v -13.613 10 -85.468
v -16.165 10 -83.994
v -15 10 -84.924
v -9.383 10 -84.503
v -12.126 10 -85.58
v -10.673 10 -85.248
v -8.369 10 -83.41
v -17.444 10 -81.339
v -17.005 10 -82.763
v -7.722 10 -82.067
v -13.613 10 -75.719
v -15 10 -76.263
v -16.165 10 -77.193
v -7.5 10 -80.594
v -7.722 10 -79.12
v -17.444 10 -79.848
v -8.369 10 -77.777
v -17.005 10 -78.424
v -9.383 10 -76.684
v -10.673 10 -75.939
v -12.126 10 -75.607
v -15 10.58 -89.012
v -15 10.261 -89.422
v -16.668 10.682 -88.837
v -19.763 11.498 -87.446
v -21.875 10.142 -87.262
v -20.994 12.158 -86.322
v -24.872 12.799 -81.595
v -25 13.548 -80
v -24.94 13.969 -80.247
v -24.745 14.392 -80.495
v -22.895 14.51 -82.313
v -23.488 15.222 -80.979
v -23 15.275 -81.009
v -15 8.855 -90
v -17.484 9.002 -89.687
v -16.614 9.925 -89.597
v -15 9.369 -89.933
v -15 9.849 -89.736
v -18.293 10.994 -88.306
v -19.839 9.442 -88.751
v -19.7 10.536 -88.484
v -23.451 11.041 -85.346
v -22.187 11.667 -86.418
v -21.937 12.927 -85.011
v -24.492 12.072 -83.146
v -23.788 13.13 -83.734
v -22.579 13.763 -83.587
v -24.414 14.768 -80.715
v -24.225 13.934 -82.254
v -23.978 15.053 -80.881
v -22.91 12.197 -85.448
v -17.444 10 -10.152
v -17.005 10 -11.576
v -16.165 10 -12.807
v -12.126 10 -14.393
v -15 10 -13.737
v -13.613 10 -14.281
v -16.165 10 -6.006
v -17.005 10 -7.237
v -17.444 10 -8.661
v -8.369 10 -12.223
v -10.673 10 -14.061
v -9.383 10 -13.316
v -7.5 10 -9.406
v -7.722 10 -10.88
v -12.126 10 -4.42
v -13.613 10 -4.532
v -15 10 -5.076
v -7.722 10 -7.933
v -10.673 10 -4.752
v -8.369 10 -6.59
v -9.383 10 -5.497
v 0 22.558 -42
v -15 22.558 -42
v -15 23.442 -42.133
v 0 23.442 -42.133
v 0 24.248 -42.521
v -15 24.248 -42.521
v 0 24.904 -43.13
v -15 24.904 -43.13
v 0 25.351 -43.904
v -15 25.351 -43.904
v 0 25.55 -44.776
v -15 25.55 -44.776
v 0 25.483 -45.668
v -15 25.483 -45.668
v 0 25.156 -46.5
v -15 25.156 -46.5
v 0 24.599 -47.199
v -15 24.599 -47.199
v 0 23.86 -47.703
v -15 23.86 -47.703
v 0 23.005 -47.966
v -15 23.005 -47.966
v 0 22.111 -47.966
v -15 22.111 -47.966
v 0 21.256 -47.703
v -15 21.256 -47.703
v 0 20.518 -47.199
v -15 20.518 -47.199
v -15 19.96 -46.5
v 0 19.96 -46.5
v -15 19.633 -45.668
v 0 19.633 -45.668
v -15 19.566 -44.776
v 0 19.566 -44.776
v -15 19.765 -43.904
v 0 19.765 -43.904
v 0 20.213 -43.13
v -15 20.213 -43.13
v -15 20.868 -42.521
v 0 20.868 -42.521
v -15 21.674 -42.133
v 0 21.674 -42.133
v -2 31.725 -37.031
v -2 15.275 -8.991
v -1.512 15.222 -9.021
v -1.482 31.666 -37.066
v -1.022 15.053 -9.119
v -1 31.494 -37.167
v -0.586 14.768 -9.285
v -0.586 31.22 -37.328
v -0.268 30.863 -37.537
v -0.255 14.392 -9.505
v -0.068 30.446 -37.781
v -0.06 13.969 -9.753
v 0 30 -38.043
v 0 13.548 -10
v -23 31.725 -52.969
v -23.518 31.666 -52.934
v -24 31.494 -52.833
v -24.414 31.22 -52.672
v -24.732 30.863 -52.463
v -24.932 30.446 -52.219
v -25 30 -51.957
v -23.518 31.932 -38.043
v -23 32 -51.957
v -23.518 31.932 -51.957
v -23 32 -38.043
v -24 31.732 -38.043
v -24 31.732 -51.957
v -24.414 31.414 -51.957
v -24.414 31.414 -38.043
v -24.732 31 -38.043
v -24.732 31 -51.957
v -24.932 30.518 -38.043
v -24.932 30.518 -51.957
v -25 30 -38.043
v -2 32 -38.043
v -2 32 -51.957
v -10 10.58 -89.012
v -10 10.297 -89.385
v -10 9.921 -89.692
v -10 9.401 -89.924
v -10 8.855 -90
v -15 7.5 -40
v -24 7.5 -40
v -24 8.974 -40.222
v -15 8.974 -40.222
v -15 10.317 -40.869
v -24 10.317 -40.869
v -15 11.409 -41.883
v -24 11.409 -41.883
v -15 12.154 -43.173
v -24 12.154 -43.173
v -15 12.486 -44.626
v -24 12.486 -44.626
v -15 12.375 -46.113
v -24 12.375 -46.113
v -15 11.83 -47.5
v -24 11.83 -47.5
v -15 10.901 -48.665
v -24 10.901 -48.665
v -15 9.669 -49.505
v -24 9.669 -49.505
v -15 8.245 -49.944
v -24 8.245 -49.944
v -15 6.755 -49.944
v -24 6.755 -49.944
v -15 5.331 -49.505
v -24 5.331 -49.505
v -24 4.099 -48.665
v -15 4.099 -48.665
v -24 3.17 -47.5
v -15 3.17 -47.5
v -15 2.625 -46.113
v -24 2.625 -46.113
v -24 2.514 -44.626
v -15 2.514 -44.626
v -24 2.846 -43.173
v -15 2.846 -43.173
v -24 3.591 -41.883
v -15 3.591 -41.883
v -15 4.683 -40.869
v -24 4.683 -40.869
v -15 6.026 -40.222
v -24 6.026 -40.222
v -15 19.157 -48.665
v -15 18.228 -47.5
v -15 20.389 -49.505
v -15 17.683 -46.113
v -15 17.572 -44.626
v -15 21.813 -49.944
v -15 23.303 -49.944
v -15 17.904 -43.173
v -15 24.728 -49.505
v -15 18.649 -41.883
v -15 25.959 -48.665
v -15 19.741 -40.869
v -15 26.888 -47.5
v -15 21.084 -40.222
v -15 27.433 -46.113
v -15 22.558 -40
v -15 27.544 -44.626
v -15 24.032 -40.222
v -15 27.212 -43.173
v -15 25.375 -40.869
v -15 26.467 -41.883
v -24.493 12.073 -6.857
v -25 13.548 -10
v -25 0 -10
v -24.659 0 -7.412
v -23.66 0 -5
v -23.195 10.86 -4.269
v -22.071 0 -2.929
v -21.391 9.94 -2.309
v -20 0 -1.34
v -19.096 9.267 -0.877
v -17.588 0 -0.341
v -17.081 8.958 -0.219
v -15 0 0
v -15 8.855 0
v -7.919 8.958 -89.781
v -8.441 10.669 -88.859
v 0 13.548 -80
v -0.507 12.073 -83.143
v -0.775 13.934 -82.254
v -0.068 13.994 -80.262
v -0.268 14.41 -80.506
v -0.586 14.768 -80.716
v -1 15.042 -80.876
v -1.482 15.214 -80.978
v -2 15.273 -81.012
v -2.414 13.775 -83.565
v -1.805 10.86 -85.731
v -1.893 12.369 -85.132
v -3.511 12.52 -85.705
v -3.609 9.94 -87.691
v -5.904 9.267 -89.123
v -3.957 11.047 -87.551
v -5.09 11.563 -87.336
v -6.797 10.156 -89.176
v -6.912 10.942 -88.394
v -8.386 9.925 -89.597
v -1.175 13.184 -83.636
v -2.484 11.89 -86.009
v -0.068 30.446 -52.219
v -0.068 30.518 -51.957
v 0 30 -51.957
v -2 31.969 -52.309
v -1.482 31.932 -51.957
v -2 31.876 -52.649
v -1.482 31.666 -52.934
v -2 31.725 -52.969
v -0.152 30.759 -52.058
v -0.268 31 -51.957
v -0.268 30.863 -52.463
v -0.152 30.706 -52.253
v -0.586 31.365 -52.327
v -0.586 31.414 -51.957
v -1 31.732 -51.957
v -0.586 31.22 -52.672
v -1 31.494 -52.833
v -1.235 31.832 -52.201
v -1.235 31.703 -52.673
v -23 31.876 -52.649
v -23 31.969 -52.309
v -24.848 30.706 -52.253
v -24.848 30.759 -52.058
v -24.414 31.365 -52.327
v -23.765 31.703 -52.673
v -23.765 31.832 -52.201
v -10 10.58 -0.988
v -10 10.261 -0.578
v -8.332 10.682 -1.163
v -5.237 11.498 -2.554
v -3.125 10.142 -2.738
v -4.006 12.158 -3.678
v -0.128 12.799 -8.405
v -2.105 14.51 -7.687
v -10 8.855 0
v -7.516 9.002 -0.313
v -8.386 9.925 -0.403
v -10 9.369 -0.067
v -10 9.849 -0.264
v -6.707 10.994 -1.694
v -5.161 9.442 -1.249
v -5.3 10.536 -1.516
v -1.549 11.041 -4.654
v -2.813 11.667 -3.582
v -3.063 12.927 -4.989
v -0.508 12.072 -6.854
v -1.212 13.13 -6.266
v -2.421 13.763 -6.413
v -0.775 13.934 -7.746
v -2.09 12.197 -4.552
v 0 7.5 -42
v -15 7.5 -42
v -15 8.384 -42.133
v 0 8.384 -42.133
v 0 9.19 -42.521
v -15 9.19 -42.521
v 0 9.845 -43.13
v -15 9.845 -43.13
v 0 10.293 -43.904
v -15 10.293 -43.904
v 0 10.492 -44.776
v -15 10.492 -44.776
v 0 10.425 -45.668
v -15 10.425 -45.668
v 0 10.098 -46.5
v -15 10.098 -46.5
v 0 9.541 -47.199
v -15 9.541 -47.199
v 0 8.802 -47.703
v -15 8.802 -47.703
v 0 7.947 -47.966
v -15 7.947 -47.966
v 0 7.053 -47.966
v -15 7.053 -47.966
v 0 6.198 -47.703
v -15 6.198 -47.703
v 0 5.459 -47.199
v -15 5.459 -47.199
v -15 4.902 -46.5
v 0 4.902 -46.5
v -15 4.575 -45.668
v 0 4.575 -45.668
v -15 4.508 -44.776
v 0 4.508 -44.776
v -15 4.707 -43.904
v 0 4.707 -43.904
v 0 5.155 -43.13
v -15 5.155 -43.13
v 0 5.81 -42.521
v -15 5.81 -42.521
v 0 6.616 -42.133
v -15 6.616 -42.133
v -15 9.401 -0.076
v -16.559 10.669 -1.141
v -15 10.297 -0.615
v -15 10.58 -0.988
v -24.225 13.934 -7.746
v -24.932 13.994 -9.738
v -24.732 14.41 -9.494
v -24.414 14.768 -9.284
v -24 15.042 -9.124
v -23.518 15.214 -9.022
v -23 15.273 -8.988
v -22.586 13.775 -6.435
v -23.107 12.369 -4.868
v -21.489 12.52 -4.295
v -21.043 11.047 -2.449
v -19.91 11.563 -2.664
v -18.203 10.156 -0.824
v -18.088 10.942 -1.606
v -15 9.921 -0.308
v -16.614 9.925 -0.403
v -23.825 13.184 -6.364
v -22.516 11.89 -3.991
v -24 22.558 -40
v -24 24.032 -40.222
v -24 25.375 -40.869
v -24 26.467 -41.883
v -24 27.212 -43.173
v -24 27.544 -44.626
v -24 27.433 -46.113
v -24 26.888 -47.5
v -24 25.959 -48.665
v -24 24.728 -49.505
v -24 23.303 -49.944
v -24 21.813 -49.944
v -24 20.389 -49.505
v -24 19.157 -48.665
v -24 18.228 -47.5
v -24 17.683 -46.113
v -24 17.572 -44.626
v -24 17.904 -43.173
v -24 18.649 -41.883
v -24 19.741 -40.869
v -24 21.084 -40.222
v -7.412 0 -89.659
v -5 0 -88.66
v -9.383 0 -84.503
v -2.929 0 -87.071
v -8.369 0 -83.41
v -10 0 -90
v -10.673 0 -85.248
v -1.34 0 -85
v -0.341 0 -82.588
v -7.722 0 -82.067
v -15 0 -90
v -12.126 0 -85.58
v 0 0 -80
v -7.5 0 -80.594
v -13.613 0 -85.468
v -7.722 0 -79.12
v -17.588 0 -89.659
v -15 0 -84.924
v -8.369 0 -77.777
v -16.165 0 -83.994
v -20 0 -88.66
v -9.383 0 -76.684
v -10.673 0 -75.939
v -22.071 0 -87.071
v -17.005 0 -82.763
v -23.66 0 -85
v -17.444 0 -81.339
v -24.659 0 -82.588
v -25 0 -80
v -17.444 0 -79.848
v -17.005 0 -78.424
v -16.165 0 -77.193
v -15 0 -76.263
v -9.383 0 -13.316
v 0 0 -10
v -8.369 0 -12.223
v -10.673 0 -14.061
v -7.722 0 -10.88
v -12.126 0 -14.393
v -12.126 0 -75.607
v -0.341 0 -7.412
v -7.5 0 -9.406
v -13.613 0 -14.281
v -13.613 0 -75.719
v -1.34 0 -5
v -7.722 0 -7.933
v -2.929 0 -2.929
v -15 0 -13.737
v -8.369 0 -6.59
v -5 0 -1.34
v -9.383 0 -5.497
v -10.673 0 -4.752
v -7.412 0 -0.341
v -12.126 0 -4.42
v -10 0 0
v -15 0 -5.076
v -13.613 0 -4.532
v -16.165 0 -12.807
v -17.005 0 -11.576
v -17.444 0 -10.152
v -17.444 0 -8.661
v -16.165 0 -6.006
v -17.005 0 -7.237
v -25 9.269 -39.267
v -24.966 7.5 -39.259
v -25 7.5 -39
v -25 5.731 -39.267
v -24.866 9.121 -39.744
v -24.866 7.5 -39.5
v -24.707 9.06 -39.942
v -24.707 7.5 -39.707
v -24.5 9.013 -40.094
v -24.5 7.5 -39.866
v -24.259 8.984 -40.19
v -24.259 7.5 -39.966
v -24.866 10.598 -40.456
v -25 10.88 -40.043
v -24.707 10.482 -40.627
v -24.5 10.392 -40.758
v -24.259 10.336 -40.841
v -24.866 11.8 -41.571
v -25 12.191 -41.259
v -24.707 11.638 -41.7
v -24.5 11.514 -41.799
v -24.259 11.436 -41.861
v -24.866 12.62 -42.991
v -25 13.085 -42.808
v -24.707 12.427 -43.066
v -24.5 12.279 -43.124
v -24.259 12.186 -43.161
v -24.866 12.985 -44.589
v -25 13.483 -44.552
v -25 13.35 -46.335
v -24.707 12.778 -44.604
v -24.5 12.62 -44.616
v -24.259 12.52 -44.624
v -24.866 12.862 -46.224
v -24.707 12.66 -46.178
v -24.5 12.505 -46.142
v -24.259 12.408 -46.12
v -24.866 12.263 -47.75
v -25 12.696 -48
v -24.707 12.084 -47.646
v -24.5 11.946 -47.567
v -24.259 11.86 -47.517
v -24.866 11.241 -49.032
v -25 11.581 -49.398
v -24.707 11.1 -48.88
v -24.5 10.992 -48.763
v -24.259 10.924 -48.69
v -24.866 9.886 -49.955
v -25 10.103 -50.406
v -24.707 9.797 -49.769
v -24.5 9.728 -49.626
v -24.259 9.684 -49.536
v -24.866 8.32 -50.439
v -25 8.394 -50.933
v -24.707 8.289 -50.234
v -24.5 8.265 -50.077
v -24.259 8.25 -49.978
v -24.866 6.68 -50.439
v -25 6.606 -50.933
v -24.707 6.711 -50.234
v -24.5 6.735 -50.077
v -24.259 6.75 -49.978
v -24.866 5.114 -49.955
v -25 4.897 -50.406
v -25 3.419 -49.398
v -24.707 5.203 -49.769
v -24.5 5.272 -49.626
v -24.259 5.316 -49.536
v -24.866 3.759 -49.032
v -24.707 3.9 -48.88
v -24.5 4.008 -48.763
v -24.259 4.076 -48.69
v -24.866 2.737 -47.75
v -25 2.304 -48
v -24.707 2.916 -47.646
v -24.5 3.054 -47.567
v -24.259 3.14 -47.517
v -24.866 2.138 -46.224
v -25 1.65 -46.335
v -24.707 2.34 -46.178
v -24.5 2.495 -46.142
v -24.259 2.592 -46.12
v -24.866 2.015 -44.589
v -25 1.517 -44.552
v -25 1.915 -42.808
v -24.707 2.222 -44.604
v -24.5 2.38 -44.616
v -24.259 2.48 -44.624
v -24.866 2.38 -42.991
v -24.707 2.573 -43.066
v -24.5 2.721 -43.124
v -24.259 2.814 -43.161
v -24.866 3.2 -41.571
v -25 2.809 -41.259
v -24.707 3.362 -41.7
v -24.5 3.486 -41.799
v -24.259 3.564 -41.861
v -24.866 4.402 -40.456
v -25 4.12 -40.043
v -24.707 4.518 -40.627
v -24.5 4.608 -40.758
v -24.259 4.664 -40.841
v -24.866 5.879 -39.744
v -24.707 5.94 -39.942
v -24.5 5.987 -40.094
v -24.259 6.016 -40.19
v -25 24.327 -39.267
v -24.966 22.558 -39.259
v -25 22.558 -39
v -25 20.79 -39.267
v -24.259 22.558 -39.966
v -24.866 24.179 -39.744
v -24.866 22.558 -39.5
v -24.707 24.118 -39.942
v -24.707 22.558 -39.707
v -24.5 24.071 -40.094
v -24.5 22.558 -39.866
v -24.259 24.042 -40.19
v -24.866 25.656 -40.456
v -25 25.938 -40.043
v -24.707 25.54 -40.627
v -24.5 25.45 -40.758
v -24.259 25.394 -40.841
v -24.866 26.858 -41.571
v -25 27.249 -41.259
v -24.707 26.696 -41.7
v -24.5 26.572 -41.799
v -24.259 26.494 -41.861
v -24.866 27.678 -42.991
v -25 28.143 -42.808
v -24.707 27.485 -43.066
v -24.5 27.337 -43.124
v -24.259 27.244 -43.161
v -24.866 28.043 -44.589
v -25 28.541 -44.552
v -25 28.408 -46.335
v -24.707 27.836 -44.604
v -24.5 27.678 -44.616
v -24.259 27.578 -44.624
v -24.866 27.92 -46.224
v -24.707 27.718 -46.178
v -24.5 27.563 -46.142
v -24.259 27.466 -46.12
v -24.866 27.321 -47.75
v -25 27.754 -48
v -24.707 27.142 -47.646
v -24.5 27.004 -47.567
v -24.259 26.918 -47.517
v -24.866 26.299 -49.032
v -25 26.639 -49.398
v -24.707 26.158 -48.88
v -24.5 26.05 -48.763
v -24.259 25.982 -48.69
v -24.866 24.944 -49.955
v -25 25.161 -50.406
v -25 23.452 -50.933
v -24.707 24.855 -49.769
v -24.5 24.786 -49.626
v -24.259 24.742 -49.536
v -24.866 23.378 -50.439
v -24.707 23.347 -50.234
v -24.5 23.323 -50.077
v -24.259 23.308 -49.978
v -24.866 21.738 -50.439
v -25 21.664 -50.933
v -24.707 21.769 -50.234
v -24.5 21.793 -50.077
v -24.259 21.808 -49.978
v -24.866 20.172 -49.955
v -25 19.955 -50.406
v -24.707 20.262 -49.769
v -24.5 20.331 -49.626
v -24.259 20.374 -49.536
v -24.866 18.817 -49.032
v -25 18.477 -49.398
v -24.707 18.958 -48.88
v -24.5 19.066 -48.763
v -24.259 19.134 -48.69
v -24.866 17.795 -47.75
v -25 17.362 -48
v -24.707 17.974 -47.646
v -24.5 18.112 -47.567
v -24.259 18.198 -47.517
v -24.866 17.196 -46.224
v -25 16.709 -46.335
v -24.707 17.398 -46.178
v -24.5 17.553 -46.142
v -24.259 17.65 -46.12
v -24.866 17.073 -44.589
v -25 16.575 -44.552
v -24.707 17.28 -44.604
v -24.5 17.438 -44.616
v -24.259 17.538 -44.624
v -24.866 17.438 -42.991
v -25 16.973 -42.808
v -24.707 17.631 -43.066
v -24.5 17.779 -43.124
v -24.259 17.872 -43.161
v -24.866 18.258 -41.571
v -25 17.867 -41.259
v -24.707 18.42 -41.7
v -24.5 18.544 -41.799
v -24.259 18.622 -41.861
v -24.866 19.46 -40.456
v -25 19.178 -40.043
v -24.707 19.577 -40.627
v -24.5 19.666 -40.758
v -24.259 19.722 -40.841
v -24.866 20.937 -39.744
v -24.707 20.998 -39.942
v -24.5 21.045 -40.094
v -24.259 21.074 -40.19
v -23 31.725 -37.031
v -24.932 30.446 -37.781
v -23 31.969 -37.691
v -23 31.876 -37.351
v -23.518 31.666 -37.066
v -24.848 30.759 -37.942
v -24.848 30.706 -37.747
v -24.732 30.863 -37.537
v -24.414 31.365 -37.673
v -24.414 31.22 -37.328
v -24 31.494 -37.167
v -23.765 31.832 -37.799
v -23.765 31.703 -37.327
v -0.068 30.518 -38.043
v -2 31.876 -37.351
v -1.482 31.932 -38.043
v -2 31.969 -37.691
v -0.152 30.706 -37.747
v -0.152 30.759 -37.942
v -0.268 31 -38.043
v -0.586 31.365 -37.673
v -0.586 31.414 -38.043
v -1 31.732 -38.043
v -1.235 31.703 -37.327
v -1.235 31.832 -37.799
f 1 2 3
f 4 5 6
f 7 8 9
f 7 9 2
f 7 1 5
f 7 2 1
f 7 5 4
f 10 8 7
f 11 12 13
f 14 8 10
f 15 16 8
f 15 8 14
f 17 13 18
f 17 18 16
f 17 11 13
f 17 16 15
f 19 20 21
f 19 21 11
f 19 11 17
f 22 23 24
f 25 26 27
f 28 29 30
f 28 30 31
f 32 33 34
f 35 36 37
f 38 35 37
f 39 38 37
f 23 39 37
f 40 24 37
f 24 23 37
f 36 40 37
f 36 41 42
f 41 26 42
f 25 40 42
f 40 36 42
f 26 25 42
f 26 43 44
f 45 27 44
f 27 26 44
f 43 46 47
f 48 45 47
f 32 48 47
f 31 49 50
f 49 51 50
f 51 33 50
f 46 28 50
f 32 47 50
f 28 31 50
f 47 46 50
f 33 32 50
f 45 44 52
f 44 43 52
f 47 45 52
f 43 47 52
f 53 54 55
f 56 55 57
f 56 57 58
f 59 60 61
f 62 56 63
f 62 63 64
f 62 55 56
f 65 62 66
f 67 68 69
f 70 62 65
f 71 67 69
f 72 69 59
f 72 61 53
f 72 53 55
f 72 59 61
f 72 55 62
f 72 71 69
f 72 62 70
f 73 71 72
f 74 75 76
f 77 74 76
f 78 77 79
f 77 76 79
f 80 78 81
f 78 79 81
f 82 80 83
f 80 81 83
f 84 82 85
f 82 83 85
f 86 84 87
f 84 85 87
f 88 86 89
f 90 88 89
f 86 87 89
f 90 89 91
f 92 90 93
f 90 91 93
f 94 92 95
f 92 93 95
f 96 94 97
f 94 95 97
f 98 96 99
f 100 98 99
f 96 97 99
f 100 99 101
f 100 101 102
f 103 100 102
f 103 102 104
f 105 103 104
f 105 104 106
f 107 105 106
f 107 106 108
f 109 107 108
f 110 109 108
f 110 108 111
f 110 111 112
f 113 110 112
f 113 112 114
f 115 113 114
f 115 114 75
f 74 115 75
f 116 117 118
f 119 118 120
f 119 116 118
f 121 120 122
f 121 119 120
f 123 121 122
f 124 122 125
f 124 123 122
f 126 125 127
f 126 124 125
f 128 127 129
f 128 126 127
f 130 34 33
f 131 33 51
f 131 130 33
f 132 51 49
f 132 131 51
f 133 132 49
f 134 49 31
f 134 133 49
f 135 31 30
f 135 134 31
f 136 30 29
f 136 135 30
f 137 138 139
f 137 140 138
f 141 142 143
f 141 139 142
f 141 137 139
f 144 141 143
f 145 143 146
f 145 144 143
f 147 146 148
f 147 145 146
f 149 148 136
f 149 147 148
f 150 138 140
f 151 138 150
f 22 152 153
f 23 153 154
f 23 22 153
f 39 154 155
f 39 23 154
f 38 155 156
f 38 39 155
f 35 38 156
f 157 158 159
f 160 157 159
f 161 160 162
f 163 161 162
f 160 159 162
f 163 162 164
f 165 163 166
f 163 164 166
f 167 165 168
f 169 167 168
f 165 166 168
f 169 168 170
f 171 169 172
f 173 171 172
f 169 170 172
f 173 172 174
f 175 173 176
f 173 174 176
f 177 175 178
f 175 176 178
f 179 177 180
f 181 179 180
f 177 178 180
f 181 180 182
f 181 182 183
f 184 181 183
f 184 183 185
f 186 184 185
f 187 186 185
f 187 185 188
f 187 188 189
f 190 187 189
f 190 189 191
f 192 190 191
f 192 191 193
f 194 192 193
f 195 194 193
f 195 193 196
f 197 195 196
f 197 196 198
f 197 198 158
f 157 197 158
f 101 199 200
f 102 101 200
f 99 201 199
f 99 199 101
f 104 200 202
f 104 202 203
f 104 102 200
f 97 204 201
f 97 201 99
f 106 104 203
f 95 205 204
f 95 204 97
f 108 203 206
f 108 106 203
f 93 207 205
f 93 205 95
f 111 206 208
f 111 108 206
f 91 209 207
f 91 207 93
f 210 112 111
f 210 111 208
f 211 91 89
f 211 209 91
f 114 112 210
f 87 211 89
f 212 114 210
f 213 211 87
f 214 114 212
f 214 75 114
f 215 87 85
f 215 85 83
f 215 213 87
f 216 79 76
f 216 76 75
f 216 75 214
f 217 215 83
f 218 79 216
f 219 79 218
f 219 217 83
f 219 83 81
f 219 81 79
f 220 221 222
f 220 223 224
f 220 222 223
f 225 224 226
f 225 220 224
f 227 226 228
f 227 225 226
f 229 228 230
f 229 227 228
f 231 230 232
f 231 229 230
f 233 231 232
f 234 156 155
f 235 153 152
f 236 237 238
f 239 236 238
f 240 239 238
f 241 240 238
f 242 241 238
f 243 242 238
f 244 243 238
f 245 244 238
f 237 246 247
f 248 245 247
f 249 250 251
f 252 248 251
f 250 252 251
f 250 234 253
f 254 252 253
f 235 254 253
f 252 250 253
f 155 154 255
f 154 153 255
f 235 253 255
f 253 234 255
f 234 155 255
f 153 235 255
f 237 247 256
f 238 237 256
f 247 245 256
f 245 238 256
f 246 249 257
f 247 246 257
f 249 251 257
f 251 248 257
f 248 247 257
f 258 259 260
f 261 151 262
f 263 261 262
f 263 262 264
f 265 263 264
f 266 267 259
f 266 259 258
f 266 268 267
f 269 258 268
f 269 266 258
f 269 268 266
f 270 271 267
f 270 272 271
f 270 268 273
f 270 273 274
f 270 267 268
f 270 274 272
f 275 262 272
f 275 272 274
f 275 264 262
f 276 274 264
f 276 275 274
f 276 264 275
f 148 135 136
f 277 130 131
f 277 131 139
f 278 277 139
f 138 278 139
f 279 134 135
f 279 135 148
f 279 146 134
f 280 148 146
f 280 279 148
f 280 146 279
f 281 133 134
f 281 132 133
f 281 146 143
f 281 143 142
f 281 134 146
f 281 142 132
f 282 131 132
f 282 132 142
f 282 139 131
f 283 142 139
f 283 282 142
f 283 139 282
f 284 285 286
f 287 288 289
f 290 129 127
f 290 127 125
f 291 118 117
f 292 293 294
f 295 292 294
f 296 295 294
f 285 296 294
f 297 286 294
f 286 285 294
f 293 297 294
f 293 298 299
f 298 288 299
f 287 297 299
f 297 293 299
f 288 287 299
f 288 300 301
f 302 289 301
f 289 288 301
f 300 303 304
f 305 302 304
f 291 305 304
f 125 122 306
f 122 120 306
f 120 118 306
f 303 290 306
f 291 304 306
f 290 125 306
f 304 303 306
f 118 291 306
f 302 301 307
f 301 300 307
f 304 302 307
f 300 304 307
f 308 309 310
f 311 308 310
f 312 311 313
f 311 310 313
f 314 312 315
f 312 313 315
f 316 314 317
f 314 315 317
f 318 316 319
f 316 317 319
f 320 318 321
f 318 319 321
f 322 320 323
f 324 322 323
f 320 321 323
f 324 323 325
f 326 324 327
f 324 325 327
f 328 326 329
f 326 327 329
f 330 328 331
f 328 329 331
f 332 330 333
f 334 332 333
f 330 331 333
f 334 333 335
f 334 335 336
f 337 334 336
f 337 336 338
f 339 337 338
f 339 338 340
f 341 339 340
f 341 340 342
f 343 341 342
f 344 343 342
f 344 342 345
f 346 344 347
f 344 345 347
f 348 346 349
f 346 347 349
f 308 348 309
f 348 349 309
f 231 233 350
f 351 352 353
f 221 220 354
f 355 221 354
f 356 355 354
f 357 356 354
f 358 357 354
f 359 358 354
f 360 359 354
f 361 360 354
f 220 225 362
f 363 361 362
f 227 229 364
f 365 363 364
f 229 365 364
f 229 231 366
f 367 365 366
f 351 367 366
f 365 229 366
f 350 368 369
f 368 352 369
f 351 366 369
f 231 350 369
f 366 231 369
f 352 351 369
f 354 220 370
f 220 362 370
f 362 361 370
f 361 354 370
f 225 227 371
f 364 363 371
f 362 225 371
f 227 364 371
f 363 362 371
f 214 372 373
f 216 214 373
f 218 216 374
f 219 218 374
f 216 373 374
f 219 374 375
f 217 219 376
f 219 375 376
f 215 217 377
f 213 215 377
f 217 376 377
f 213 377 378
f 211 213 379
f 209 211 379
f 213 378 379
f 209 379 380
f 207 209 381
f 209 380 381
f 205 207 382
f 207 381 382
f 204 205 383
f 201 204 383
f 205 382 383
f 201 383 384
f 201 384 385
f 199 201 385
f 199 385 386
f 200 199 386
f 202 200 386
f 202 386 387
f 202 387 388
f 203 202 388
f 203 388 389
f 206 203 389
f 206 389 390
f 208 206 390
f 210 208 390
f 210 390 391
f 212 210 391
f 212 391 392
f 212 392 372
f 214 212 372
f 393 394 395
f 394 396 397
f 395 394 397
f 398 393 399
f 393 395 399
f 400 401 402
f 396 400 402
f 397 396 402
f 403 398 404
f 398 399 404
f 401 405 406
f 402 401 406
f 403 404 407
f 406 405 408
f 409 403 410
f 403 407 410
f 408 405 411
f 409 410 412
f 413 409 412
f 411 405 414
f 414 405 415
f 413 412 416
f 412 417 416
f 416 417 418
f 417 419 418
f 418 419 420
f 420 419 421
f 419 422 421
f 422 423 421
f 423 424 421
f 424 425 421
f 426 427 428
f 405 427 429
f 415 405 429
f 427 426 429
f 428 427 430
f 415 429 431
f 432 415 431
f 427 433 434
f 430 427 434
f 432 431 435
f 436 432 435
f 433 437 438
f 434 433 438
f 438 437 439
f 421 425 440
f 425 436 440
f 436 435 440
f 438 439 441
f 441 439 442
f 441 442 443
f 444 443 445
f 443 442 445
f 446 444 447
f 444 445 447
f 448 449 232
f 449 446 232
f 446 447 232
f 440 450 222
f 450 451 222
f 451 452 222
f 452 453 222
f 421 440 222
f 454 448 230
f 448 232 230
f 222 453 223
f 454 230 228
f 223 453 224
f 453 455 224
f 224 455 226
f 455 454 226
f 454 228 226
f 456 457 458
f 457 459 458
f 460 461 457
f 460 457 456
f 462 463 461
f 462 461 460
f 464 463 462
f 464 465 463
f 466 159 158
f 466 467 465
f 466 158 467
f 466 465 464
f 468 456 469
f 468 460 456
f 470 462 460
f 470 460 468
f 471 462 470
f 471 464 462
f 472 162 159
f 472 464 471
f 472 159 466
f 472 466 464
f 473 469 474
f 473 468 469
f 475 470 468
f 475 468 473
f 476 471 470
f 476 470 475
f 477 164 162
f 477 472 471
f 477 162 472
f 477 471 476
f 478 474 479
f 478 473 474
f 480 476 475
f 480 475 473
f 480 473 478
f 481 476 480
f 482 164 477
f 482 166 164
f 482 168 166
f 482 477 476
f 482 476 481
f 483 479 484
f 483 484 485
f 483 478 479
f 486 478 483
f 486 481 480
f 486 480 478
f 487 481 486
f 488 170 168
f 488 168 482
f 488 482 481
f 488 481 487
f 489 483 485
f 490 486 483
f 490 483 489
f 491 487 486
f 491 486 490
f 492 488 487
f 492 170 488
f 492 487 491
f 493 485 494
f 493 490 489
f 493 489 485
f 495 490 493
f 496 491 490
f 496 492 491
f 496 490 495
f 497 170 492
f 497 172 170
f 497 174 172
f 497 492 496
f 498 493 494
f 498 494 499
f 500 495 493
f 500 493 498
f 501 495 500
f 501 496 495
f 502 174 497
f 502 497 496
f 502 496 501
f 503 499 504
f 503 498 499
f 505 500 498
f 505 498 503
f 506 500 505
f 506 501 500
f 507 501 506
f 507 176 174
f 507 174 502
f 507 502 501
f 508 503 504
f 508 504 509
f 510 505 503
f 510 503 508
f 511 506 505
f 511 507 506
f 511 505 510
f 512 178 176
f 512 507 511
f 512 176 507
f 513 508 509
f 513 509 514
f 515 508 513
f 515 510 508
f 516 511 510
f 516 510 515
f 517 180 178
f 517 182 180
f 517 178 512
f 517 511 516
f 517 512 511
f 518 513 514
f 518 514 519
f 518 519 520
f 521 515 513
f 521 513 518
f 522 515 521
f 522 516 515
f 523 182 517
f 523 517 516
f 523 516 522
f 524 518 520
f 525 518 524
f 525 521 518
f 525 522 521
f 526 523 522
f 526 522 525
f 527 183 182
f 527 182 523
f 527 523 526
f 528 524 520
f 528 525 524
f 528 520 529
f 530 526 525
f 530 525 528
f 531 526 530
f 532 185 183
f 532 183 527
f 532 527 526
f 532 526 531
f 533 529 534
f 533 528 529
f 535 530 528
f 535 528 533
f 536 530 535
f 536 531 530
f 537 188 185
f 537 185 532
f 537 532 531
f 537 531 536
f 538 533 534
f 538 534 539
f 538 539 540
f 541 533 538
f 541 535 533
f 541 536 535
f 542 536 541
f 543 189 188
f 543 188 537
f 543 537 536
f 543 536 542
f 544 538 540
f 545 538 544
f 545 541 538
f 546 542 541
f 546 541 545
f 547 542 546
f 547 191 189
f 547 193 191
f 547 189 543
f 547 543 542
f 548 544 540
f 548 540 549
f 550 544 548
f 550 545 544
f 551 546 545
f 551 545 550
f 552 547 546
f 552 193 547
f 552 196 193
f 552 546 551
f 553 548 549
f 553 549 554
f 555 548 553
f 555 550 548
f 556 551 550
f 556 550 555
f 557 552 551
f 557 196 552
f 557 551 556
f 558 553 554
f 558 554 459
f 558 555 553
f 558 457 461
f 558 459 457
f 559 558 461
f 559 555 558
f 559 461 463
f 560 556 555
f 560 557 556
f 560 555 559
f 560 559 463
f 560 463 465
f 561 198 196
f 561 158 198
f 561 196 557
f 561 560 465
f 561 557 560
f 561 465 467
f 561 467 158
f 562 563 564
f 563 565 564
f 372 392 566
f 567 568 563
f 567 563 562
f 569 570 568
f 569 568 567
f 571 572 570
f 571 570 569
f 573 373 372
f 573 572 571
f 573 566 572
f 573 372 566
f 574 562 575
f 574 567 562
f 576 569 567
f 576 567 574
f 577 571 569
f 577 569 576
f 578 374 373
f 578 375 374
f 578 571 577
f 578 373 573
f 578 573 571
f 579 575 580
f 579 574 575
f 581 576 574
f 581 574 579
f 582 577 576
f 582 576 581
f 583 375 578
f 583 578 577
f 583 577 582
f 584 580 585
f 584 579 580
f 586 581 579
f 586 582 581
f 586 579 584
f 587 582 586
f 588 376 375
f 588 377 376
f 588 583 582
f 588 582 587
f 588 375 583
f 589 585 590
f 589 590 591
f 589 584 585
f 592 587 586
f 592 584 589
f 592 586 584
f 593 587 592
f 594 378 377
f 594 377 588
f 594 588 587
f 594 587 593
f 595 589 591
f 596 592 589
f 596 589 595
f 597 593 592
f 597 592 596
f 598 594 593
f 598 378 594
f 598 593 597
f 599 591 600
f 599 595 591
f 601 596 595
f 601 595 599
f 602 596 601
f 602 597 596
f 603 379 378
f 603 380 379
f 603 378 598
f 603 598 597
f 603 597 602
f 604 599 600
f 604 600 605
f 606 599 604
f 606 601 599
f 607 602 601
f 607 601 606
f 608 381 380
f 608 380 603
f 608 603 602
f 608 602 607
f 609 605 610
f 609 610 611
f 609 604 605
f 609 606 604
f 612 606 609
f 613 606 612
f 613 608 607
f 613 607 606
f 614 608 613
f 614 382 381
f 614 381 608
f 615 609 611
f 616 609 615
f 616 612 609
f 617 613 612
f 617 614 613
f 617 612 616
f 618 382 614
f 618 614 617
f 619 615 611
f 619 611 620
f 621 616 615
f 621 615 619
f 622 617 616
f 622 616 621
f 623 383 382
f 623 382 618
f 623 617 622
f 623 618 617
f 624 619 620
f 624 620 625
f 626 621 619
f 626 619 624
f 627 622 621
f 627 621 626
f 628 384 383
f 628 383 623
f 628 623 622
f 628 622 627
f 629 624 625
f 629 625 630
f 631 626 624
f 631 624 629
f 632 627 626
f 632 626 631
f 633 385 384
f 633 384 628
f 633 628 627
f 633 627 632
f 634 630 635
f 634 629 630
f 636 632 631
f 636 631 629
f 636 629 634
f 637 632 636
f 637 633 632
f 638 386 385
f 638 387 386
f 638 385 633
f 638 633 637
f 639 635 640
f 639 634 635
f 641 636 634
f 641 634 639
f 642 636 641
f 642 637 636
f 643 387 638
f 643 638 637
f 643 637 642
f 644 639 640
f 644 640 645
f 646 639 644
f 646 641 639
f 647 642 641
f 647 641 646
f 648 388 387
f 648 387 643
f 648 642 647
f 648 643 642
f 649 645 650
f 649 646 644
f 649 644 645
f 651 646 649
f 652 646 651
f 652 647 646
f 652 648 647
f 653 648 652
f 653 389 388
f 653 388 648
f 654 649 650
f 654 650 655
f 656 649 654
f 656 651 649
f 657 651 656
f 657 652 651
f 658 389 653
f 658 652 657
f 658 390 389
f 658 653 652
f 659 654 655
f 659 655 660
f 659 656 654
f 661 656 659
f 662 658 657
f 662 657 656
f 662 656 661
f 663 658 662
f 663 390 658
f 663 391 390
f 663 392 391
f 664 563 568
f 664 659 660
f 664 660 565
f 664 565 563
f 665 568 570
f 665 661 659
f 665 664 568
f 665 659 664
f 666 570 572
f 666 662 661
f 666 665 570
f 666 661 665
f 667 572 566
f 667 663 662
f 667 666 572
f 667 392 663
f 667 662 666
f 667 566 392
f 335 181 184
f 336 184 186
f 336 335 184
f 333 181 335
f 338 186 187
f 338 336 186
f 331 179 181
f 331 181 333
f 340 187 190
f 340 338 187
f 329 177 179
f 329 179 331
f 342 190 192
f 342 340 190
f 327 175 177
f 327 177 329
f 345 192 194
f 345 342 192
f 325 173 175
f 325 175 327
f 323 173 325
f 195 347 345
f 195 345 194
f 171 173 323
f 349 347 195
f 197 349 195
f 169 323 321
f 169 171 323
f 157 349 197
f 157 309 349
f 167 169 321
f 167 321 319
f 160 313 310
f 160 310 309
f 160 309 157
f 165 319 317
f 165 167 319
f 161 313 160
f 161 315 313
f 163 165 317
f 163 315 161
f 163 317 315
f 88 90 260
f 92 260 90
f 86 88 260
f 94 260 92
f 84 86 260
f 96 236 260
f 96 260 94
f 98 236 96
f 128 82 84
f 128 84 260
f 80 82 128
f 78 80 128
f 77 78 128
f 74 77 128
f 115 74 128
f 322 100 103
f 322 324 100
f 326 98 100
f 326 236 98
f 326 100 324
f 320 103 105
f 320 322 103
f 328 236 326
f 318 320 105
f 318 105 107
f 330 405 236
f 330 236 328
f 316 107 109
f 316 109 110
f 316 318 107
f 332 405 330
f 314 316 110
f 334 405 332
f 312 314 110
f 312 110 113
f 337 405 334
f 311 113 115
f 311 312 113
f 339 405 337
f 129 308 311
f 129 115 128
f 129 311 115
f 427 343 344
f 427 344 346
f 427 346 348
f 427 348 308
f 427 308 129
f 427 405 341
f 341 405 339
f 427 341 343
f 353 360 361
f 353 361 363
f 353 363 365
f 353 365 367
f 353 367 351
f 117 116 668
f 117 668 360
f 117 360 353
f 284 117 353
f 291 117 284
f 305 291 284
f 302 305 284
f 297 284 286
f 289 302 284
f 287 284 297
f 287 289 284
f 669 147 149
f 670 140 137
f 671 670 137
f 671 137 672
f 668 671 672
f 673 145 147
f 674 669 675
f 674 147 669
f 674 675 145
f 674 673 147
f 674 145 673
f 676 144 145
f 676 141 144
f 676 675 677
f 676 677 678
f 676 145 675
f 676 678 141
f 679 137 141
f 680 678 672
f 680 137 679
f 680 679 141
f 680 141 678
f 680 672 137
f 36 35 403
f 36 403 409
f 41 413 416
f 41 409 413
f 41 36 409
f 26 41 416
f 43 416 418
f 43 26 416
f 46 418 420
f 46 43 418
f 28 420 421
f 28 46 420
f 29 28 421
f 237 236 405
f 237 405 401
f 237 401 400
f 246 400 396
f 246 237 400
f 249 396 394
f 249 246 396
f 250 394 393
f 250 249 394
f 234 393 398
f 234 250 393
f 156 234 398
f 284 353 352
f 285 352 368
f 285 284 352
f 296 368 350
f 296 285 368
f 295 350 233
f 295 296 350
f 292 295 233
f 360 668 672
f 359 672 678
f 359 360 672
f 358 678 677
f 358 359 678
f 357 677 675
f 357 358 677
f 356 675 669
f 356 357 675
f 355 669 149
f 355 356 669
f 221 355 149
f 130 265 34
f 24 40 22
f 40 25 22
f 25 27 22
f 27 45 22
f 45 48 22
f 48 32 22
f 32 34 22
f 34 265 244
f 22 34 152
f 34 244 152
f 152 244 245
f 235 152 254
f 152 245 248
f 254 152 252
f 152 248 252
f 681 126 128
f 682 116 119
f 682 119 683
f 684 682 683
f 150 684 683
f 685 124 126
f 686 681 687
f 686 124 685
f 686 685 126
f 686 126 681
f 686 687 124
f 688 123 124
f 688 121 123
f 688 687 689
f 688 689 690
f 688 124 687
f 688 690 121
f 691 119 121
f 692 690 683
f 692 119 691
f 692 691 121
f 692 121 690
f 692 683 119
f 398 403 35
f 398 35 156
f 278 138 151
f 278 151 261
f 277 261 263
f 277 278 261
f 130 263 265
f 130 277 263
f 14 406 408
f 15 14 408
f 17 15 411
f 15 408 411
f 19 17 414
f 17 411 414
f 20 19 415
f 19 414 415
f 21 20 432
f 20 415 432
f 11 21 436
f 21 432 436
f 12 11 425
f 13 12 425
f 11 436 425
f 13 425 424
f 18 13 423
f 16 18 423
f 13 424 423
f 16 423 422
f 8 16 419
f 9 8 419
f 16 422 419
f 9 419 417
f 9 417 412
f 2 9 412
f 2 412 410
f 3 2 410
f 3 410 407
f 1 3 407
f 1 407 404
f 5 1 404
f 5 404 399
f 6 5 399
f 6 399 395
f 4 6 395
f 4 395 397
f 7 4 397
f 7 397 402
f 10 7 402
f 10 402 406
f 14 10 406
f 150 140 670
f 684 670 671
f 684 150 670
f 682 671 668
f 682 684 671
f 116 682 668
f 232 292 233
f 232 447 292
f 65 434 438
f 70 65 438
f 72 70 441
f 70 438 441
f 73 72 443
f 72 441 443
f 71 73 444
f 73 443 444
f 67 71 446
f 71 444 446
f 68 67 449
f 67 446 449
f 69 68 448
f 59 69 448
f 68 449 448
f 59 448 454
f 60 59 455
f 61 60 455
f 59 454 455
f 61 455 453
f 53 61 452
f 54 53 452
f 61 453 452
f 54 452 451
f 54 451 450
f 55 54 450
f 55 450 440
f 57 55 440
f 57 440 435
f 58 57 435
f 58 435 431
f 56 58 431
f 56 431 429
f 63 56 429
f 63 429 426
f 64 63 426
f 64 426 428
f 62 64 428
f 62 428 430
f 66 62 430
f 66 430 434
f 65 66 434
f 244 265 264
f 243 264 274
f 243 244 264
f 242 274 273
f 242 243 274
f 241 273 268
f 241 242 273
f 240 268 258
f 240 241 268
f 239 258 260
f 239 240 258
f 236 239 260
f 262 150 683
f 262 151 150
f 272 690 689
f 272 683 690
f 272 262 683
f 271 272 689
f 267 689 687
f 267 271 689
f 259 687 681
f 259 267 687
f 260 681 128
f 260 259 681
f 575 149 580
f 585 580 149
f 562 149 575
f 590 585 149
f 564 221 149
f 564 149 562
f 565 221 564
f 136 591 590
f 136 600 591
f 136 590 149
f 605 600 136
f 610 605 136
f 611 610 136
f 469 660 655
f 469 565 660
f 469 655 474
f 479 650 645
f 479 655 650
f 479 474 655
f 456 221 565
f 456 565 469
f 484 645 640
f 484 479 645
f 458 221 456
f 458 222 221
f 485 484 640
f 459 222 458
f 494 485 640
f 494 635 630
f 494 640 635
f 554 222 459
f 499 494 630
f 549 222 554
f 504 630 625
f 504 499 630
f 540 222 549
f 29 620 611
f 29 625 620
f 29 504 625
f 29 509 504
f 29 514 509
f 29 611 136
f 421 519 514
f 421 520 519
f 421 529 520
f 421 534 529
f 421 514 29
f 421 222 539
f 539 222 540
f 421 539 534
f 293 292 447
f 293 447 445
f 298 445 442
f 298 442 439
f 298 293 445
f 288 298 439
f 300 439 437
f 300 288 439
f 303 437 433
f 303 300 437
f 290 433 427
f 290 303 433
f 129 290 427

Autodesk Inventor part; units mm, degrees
ref_plane "YZ Plane" through (0, 0, 0) normal (1, 0, 0) x (0, 1, 0)
ref_plane "XZ Plane" through (0, 0, 0) normal (0, 1, 0) x (-1, 0, 0)
ref_plane "XY Plane" through (0, 0, 0) normal (0, 0, 1) x (1, 0, 0)
sketch "Sketch1" plane through (0, 0, 0) normal (0, 1, 0) x (-1, 0, 0)
  line L0 (0, 0) -> (25, 0)
  line L1 (25, 0) -> (25, -90)
  line L2 (25, -90) -> (0, -90)
  line L3 (0, -90) -> (0, 0)
  dimension "d0" = 25
  dimension "d1" = 90
extrude "Extrusion1" add sketch "Sketch1" along normal blind 10
sketch "Sketch2" plane through (0, 10, 0) normal (0, 1, 0) x (1, 0, 0)
  line L0 (-25, 90) -> (-25, 0) projected
  line L1 (0, 0) -> (0, 90) projected
  line L2 (-25, 37.5) -> (0, 37.5)
  line L3 (0, 37.5) -> (0, 52.5)
  line L4 (0, 52.5) -> (-25, 52.5)
  line L5 (-25, 52.5) -> (-25, 37.5)
  line L6 (-25, 0) -> (0, 0) projected
  point P0 (-25, 80)
  point P1 (-25, 10)
  point P2 (0, 10)
  point P3 (0, 80)
  point P4 (-15, 0)
  point P5 (-10, 0)
  point P6 (0, 37.5)
  dimension "d5" = 15
  dimension "d6" = 37.5
extrude "Extrusion2" add sketch "Sketch2" along normal blind 22 contours L4 L1 L2 L0
sketch "Sketch3" plane through (-25, 10, -37.5) normal (0, 0, 1) x (1, 0, 0)
  point P0 (25, -10)
sketch "Sketch5" plane through (0, 0, 0) normal (1, 0, 0) x (0, 0, -1)
  line L0 (37.5, 10) -> (37.5, 32) projected
  line L1 (0, 10) -> (37.5, 10) projected
  line L2 (37.5, 32) -> (0, 10)
  line L3 (37.5, 32) -> (52.5, 32) projected
  line L4 (52.5, 32) -> (90, 10)
  line L5 (90, 10) -> (52.5, 10) projected
  line L6 (52.5, 10) -> (90, 10)
  line L7 (52.5, 10) -> (52.5, 32) projected
  line L8 (52.5, 32) -> (52.5, 10)
  point P0 (0, 0)
extrude "Extrusion3" add sketch "Sketch5" against normal blind 25
fillet "Fillet2" radius 10 4 edges at (-25, 5, 0) (0, 5, 0) (-25, 5, -90) (0, 5, -90)
fillet "Fillet3" radius 2 14 edges at (-12.5, 32, -52.5) (-12.5, 32, -37.5) (0, 32, -45) (-2.9289, 11.7183, -87.0711) (-12.5, 10, -90) (-22.0711, 11.7183, -87.0711) (-25, 23.9333, -66.25) (0, 23.9333, -66.25) (-2.9289, 11.7183, -2.9289) (-12.5, 10, 0) (-22.0711, 11.7183, -2.9289) (-25, 23.9333, -23.75) (0, 23.9333, -23.75) (-25, 32, -45)
sketch "Sketch6" plane through (-25, 0, -80) normal (-1, 0, 0) x (0, 0, 1)
  line L0 (28.0434, 30) -> (41.9566, 30) projected
  line L1 (35, 30) -> (35, 15)
  line L2 (70, 0) -> (0, 0) projected
  line L3 (35, 30) -> (35, 0)
  line L4 (35, 15) -> (35, 0)
  circle A0 centre (35, 7.5) radius 3
  circle A1 centre (35, 22.5581) radius 3
  point P0 (80, 0)
  point P1 (35, 22.5)
  dimension "d13" = 6
  dimension "d14" = 7.5
  dimension "d15" = 6
extrude "Extrusion4" cut sketch "Sketch6" against normal blind 25
sketch "Sketch7" plane through (-25, 0, -80) normal (-1, 0, 0) x (0, 0, 1)
  circle A0 centre (35, 22.5581) radius 3 projected
  line L0 (35, 25.5581) -> (35, 19.5581)
  circle A1 centre (35, 22.5581) radius 5
  circle A2 centre (35, 7.5) radius 3 projected
  line L1 (35, 10.5) -> (35, 4.5)
  circle A3 centre (35, 7.5) radius 5
  point P0 (80, 0)
  dimension "d18" = 10
  dimension "d19" = 10
extrude "Extrusion5" cut sketch "Sketch7" against normal blind 10
fillet "Fillet4" radius 1 2 edges at (-25, 22.5581, -50) (-25, 7.5, -50)
sketch "Sketch8" plane through (0, 0, 0) normal (0, -1, 0) x (1, 0, 0)
  line L0 (-10, -90) -> (-15, -90) projected
  line L1 (-12.5, -90) -> (-12.5, 0)
  line L2 (-15, 0) -> (-10, 0) projected
  circle A0 centre (-12.5, -80.5935) radius 5
  circle A1 centre (-12.5, -9.4065) radius 5
  point P0 (0, 0)
  point P1 (-12.5, -45)
  point P2 (-12.5, -4.4065)
  point P3 (-12.5, -14.4065)
  point P4 (-12.5, -75.5935)
  point P5 (-12.5, -85.5935)
  dimension "d23" = 71.187
  dimension "d24" = 10
  dimension "d25" = 10
  dimension "d26" = 35.5935
extrude "Extrusion6" cut sketch "Sketch8" against normal blind 10
properties part number "Triangle_Bracket"
